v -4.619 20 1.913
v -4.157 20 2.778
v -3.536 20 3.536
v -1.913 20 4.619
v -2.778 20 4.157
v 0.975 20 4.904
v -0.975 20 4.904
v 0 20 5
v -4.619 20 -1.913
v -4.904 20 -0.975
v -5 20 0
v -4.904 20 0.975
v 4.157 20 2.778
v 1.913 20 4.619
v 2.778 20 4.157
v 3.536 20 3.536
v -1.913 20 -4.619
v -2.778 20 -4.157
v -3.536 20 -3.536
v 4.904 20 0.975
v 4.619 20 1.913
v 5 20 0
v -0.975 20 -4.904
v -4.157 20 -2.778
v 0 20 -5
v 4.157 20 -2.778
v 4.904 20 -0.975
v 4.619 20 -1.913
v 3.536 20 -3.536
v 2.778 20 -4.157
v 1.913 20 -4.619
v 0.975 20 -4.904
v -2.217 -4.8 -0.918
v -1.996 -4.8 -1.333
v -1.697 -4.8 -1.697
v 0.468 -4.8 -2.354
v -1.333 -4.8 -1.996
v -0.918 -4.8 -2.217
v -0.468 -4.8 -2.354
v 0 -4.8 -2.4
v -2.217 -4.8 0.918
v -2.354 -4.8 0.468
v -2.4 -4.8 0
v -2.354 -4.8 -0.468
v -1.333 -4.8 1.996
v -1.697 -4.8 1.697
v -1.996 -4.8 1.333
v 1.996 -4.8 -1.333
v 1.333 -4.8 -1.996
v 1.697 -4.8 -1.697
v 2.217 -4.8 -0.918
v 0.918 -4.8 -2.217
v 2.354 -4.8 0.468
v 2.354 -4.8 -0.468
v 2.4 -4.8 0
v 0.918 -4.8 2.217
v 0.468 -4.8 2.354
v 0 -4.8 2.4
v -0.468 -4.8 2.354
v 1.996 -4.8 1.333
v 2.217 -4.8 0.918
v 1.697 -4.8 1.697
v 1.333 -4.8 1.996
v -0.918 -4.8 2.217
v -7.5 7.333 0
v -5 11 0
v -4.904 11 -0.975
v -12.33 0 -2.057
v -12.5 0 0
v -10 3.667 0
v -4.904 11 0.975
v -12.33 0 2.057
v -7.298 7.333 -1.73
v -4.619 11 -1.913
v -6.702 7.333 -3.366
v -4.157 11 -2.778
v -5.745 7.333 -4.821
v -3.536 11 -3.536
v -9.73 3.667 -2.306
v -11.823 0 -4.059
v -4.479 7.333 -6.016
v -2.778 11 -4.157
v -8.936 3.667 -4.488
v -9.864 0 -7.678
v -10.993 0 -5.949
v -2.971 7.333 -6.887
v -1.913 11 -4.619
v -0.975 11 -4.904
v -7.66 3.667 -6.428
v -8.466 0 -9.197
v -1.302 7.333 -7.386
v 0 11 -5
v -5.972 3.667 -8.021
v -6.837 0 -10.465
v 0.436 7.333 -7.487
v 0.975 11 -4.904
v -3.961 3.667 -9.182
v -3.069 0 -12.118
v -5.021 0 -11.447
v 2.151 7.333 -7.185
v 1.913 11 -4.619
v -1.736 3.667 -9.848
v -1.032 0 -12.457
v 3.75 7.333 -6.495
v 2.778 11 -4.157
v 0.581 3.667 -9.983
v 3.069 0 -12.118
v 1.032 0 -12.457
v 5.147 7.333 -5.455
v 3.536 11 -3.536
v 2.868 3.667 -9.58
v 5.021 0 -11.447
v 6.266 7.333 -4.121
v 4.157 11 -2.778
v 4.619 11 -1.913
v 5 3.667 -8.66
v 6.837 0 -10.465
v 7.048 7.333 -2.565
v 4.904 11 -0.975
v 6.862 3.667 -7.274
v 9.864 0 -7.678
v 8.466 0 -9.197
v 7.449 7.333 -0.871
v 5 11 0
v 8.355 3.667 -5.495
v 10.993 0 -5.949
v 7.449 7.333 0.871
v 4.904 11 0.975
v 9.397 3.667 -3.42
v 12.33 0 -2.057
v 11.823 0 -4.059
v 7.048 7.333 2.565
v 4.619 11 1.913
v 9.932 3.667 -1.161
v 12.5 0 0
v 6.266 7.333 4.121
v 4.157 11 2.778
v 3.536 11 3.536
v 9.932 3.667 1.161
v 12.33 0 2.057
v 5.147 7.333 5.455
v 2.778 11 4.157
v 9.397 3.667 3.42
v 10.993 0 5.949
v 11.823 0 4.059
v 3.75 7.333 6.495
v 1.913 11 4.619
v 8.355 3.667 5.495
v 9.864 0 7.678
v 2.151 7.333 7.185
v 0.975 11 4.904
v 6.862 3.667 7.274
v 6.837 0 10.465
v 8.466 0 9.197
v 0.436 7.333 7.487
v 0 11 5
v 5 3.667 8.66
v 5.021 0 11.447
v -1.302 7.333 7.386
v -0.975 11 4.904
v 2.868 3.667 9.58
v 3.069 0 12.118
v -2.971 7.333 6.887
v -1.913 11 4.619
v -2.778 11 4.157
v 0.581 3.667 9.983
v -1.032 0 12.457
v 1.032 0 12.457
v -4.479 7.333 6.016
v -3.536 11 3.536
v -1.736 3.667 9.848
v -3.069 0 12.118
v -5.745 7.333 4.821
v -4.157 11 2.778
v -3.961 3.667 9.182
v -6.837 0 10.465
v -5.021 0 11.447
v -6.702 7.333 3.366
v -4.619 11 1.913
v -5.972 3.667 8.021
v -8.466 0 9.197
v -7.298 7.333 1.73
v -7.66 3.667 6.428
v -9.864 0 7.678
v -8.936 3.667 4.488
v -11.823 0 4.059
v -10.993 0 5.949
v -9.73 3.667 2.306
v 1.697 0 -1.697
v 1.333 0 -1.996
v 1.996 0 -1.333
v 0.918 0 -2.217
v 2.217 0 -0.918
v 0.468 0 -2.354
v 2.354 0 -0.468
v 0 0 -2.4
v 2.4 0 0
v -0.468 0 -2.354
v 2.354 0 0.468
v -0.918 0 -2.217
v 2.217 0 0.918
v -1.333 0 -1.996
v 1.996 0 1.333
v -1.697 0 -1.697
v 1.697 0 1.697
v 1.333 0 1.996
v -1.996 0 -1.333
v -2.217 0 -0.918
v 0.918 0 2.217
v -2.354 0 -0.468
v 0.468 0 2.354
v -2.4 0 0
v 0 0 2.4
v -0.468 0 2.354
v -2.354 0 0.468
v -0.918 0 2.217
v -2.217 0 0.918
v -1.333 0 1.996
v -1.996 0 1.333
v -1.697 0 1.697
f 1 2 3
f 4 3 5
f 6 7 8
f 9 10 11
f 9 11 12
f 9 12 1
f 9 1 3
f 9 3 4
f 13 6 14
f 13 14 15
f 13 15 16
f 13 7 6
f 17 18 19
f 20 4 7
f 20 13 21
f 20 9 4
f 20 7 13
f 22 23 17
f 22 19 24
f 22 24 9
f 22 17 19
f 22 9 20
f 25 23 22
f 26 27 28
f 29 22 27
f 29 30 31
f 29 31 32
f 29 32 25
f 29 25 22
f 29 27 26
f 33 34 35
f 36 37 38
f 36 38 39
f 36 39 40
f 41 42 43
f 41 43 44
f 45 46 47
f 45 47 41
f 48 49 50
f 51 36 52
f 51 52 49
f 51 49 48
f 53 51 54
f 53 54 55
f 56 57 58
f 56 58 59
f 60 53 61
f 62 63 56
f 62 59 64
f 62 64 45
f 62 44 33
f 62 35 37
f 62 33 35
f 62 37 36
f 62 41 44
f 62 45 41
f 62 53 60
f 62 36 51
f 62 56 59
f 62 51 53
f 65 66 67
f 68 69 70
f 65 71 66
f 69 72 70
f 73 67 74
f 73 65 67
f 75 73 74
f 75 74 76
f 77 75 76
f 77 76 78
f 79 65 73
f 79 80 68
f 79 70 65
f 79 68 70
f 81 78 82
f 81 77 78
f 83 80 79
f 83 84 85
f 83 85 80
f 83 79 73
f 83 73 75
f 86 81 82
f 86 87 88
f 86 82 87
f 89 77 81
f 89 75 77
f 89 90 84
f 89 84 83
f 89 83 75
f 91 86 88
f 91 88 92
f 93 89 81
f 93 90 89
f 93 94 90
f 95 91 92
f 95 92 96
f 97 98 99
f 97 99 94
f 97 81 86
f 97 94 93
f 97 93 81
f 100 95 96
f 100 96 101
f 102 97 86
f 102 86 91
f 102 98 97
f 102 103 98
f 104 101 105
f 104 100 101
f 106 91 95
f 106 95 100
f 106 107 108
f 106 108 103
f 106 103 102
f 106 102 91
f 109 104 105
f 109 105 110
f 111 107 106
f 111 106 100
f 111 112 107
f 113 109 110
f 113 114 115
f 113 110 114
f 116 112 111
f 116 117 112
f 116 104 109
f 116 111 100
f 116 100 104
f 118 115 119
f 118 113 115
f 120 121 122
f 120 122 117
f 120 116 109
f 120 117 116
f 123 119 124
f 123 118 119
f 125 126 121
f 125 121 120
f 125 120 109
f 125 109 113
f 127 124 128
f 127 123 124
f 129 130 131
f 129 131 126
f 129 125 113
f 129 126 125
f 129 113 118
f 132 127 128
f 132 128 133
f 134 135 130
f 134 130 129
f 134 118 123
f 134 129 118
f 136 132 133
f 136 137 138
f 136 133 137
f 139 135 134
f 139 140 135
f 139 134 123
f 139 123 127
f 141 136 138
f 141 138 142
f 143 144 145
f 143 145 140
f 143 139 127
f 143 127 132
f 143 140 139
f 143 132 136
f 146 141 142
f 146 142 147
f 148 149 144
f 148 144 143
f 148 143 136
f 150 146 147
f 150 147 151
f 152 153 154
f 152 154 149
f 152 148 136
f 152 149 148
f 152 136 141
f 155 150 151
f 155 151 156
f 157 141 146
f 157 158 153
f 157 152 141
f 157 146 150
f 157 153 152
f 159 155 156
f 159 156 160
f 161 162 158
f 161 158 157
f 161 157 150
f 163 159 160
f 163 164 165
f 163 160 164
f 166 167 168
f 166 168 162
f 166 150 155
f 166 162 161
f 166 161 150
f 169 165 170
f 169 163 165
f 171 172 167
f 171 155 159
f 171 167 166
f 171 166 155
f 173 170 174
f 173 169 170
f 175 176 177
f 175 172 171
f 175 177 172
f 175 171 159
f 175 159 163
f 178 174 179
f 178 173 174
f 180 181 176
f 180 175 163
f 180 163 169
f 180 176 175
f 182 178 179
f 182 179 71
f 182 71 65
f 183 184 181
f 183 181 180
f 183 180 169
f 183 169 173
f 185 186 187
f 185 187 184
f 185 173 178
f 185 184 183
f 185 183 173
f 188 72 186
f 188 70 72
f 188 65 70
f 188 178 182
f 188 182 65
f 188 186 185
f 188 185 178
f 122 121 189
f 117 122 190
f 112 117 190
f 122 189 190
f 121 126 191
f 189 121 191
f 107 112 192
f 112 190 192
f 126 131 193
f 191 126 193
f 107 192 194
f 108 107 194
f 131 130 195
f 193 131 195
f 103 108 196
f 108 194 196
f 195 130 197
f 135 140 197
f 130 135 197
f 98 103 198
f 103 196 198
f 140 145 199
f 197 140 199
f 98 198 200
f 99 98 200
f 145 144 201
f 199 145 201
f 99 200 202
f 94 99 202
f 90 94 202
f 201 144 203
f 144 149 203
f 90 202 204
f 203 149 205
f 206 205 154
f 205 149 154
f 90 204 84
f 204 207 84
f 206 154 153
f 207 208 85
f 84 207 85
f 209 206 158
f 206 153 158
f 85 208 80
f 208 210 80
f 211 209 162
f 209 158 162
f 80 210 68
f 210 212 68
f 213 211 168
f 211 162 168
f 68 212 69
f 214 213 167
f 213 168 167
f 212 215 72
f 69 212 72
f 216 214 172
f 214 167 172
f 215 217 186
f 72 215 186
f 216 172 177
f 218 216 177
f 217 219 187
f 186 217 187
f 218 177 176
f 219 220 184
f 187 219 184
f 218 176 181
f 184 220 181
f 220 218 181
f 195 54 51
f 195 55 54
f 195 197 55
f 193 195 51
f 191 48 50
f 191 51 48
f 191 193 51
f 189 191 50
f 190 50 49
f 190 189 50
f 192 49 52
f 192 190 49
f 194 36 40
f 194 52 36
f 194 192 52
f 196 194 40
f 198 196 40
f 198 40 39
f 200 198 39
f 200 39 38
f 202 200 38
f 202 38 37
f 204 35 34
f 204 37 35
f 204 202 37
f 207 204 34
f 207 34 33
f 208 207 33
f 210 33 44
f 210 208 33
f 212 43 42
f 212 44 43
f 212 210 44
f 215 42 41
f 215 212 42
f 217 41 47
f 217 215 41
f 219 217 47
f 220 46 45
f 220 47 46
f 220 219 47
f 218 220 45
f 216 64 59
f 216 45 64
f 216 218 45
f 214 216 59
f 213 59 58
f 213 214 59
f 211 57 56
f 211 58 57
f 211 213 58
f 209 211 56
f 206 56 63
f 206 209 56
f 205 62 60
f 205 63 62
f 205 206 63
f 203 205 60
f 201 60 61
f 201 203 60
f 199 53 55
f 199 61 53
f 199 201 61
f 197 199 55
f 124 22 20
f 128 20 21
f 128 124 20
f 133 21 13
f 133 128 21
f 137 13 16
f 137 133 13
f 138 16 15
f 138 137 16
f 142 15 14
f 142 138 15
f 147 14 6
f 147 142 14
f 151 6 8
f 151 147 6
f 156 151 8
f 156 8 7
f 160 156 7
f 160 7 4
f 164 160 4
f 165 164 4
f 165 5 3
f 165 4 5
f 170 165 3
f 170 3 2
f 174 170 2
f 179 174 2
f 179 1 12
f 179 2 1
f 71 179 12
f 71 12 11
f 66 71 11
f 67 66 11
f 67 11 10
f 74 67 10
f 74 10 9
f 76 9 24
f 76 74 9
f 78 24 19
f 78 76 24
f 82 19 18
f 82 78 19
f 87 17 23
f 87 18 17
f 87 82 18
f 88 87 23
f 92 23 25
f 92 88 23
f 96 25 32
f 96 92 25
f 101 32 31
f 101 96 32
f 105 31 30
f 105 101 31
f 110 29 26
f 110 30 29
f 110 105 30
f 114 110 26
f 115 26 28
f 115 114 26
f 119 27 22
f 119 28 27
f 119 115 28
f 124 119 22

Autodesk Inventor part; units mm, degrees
ref_plane "YZ Plane" through (0, 0, 0) normal (1, 0, 0) x (0, 1, 0)
ref_plane "XZ Plane" through (0, 0, 0) normal (0, 1, 0) x (-1, 0, 0)
ref_plane "XY Plane" through (0, 0, 0) normal (0, 0, 1) x (1, 0, 0)
sketch "Sketch1" plane through (0, 0, 0) normal (0, 1, 0) x (-1, 0, 0)
  circle A0 centre (0, 0) radius 12.5
  dimension "d0" = 25
extrude "Extrusion1" add sketch "Sketch1" along normal blind 11
chamfer "Chamfer1" distance 7.5 distance2 11 1 edges at (12.5, 11, 0) measured on face at (-2.488, 11, -2.432)
sketch "Sketch2" plane through (0, 11, 0) normal (0, 1, 0) x (1, 0, 0)
  circle A0 centre (0, 0) radius 5 projected
  circle A1 centre (0, 0) radius 5
extrude "Extrusion2" add sketch "Sketch2" along normal blind 9
sketch "Sketch3" plane through (0, 0, 0) normal (0, -1, 0) x (1, 0, 0)
  circle A0 centre (0, 0) radius 2.4
  dimension "d8" = 4.8
extrude "Extrusion3" add sketch "Sketch3" along normal blind 4.8
properties part number "pladsholder"
